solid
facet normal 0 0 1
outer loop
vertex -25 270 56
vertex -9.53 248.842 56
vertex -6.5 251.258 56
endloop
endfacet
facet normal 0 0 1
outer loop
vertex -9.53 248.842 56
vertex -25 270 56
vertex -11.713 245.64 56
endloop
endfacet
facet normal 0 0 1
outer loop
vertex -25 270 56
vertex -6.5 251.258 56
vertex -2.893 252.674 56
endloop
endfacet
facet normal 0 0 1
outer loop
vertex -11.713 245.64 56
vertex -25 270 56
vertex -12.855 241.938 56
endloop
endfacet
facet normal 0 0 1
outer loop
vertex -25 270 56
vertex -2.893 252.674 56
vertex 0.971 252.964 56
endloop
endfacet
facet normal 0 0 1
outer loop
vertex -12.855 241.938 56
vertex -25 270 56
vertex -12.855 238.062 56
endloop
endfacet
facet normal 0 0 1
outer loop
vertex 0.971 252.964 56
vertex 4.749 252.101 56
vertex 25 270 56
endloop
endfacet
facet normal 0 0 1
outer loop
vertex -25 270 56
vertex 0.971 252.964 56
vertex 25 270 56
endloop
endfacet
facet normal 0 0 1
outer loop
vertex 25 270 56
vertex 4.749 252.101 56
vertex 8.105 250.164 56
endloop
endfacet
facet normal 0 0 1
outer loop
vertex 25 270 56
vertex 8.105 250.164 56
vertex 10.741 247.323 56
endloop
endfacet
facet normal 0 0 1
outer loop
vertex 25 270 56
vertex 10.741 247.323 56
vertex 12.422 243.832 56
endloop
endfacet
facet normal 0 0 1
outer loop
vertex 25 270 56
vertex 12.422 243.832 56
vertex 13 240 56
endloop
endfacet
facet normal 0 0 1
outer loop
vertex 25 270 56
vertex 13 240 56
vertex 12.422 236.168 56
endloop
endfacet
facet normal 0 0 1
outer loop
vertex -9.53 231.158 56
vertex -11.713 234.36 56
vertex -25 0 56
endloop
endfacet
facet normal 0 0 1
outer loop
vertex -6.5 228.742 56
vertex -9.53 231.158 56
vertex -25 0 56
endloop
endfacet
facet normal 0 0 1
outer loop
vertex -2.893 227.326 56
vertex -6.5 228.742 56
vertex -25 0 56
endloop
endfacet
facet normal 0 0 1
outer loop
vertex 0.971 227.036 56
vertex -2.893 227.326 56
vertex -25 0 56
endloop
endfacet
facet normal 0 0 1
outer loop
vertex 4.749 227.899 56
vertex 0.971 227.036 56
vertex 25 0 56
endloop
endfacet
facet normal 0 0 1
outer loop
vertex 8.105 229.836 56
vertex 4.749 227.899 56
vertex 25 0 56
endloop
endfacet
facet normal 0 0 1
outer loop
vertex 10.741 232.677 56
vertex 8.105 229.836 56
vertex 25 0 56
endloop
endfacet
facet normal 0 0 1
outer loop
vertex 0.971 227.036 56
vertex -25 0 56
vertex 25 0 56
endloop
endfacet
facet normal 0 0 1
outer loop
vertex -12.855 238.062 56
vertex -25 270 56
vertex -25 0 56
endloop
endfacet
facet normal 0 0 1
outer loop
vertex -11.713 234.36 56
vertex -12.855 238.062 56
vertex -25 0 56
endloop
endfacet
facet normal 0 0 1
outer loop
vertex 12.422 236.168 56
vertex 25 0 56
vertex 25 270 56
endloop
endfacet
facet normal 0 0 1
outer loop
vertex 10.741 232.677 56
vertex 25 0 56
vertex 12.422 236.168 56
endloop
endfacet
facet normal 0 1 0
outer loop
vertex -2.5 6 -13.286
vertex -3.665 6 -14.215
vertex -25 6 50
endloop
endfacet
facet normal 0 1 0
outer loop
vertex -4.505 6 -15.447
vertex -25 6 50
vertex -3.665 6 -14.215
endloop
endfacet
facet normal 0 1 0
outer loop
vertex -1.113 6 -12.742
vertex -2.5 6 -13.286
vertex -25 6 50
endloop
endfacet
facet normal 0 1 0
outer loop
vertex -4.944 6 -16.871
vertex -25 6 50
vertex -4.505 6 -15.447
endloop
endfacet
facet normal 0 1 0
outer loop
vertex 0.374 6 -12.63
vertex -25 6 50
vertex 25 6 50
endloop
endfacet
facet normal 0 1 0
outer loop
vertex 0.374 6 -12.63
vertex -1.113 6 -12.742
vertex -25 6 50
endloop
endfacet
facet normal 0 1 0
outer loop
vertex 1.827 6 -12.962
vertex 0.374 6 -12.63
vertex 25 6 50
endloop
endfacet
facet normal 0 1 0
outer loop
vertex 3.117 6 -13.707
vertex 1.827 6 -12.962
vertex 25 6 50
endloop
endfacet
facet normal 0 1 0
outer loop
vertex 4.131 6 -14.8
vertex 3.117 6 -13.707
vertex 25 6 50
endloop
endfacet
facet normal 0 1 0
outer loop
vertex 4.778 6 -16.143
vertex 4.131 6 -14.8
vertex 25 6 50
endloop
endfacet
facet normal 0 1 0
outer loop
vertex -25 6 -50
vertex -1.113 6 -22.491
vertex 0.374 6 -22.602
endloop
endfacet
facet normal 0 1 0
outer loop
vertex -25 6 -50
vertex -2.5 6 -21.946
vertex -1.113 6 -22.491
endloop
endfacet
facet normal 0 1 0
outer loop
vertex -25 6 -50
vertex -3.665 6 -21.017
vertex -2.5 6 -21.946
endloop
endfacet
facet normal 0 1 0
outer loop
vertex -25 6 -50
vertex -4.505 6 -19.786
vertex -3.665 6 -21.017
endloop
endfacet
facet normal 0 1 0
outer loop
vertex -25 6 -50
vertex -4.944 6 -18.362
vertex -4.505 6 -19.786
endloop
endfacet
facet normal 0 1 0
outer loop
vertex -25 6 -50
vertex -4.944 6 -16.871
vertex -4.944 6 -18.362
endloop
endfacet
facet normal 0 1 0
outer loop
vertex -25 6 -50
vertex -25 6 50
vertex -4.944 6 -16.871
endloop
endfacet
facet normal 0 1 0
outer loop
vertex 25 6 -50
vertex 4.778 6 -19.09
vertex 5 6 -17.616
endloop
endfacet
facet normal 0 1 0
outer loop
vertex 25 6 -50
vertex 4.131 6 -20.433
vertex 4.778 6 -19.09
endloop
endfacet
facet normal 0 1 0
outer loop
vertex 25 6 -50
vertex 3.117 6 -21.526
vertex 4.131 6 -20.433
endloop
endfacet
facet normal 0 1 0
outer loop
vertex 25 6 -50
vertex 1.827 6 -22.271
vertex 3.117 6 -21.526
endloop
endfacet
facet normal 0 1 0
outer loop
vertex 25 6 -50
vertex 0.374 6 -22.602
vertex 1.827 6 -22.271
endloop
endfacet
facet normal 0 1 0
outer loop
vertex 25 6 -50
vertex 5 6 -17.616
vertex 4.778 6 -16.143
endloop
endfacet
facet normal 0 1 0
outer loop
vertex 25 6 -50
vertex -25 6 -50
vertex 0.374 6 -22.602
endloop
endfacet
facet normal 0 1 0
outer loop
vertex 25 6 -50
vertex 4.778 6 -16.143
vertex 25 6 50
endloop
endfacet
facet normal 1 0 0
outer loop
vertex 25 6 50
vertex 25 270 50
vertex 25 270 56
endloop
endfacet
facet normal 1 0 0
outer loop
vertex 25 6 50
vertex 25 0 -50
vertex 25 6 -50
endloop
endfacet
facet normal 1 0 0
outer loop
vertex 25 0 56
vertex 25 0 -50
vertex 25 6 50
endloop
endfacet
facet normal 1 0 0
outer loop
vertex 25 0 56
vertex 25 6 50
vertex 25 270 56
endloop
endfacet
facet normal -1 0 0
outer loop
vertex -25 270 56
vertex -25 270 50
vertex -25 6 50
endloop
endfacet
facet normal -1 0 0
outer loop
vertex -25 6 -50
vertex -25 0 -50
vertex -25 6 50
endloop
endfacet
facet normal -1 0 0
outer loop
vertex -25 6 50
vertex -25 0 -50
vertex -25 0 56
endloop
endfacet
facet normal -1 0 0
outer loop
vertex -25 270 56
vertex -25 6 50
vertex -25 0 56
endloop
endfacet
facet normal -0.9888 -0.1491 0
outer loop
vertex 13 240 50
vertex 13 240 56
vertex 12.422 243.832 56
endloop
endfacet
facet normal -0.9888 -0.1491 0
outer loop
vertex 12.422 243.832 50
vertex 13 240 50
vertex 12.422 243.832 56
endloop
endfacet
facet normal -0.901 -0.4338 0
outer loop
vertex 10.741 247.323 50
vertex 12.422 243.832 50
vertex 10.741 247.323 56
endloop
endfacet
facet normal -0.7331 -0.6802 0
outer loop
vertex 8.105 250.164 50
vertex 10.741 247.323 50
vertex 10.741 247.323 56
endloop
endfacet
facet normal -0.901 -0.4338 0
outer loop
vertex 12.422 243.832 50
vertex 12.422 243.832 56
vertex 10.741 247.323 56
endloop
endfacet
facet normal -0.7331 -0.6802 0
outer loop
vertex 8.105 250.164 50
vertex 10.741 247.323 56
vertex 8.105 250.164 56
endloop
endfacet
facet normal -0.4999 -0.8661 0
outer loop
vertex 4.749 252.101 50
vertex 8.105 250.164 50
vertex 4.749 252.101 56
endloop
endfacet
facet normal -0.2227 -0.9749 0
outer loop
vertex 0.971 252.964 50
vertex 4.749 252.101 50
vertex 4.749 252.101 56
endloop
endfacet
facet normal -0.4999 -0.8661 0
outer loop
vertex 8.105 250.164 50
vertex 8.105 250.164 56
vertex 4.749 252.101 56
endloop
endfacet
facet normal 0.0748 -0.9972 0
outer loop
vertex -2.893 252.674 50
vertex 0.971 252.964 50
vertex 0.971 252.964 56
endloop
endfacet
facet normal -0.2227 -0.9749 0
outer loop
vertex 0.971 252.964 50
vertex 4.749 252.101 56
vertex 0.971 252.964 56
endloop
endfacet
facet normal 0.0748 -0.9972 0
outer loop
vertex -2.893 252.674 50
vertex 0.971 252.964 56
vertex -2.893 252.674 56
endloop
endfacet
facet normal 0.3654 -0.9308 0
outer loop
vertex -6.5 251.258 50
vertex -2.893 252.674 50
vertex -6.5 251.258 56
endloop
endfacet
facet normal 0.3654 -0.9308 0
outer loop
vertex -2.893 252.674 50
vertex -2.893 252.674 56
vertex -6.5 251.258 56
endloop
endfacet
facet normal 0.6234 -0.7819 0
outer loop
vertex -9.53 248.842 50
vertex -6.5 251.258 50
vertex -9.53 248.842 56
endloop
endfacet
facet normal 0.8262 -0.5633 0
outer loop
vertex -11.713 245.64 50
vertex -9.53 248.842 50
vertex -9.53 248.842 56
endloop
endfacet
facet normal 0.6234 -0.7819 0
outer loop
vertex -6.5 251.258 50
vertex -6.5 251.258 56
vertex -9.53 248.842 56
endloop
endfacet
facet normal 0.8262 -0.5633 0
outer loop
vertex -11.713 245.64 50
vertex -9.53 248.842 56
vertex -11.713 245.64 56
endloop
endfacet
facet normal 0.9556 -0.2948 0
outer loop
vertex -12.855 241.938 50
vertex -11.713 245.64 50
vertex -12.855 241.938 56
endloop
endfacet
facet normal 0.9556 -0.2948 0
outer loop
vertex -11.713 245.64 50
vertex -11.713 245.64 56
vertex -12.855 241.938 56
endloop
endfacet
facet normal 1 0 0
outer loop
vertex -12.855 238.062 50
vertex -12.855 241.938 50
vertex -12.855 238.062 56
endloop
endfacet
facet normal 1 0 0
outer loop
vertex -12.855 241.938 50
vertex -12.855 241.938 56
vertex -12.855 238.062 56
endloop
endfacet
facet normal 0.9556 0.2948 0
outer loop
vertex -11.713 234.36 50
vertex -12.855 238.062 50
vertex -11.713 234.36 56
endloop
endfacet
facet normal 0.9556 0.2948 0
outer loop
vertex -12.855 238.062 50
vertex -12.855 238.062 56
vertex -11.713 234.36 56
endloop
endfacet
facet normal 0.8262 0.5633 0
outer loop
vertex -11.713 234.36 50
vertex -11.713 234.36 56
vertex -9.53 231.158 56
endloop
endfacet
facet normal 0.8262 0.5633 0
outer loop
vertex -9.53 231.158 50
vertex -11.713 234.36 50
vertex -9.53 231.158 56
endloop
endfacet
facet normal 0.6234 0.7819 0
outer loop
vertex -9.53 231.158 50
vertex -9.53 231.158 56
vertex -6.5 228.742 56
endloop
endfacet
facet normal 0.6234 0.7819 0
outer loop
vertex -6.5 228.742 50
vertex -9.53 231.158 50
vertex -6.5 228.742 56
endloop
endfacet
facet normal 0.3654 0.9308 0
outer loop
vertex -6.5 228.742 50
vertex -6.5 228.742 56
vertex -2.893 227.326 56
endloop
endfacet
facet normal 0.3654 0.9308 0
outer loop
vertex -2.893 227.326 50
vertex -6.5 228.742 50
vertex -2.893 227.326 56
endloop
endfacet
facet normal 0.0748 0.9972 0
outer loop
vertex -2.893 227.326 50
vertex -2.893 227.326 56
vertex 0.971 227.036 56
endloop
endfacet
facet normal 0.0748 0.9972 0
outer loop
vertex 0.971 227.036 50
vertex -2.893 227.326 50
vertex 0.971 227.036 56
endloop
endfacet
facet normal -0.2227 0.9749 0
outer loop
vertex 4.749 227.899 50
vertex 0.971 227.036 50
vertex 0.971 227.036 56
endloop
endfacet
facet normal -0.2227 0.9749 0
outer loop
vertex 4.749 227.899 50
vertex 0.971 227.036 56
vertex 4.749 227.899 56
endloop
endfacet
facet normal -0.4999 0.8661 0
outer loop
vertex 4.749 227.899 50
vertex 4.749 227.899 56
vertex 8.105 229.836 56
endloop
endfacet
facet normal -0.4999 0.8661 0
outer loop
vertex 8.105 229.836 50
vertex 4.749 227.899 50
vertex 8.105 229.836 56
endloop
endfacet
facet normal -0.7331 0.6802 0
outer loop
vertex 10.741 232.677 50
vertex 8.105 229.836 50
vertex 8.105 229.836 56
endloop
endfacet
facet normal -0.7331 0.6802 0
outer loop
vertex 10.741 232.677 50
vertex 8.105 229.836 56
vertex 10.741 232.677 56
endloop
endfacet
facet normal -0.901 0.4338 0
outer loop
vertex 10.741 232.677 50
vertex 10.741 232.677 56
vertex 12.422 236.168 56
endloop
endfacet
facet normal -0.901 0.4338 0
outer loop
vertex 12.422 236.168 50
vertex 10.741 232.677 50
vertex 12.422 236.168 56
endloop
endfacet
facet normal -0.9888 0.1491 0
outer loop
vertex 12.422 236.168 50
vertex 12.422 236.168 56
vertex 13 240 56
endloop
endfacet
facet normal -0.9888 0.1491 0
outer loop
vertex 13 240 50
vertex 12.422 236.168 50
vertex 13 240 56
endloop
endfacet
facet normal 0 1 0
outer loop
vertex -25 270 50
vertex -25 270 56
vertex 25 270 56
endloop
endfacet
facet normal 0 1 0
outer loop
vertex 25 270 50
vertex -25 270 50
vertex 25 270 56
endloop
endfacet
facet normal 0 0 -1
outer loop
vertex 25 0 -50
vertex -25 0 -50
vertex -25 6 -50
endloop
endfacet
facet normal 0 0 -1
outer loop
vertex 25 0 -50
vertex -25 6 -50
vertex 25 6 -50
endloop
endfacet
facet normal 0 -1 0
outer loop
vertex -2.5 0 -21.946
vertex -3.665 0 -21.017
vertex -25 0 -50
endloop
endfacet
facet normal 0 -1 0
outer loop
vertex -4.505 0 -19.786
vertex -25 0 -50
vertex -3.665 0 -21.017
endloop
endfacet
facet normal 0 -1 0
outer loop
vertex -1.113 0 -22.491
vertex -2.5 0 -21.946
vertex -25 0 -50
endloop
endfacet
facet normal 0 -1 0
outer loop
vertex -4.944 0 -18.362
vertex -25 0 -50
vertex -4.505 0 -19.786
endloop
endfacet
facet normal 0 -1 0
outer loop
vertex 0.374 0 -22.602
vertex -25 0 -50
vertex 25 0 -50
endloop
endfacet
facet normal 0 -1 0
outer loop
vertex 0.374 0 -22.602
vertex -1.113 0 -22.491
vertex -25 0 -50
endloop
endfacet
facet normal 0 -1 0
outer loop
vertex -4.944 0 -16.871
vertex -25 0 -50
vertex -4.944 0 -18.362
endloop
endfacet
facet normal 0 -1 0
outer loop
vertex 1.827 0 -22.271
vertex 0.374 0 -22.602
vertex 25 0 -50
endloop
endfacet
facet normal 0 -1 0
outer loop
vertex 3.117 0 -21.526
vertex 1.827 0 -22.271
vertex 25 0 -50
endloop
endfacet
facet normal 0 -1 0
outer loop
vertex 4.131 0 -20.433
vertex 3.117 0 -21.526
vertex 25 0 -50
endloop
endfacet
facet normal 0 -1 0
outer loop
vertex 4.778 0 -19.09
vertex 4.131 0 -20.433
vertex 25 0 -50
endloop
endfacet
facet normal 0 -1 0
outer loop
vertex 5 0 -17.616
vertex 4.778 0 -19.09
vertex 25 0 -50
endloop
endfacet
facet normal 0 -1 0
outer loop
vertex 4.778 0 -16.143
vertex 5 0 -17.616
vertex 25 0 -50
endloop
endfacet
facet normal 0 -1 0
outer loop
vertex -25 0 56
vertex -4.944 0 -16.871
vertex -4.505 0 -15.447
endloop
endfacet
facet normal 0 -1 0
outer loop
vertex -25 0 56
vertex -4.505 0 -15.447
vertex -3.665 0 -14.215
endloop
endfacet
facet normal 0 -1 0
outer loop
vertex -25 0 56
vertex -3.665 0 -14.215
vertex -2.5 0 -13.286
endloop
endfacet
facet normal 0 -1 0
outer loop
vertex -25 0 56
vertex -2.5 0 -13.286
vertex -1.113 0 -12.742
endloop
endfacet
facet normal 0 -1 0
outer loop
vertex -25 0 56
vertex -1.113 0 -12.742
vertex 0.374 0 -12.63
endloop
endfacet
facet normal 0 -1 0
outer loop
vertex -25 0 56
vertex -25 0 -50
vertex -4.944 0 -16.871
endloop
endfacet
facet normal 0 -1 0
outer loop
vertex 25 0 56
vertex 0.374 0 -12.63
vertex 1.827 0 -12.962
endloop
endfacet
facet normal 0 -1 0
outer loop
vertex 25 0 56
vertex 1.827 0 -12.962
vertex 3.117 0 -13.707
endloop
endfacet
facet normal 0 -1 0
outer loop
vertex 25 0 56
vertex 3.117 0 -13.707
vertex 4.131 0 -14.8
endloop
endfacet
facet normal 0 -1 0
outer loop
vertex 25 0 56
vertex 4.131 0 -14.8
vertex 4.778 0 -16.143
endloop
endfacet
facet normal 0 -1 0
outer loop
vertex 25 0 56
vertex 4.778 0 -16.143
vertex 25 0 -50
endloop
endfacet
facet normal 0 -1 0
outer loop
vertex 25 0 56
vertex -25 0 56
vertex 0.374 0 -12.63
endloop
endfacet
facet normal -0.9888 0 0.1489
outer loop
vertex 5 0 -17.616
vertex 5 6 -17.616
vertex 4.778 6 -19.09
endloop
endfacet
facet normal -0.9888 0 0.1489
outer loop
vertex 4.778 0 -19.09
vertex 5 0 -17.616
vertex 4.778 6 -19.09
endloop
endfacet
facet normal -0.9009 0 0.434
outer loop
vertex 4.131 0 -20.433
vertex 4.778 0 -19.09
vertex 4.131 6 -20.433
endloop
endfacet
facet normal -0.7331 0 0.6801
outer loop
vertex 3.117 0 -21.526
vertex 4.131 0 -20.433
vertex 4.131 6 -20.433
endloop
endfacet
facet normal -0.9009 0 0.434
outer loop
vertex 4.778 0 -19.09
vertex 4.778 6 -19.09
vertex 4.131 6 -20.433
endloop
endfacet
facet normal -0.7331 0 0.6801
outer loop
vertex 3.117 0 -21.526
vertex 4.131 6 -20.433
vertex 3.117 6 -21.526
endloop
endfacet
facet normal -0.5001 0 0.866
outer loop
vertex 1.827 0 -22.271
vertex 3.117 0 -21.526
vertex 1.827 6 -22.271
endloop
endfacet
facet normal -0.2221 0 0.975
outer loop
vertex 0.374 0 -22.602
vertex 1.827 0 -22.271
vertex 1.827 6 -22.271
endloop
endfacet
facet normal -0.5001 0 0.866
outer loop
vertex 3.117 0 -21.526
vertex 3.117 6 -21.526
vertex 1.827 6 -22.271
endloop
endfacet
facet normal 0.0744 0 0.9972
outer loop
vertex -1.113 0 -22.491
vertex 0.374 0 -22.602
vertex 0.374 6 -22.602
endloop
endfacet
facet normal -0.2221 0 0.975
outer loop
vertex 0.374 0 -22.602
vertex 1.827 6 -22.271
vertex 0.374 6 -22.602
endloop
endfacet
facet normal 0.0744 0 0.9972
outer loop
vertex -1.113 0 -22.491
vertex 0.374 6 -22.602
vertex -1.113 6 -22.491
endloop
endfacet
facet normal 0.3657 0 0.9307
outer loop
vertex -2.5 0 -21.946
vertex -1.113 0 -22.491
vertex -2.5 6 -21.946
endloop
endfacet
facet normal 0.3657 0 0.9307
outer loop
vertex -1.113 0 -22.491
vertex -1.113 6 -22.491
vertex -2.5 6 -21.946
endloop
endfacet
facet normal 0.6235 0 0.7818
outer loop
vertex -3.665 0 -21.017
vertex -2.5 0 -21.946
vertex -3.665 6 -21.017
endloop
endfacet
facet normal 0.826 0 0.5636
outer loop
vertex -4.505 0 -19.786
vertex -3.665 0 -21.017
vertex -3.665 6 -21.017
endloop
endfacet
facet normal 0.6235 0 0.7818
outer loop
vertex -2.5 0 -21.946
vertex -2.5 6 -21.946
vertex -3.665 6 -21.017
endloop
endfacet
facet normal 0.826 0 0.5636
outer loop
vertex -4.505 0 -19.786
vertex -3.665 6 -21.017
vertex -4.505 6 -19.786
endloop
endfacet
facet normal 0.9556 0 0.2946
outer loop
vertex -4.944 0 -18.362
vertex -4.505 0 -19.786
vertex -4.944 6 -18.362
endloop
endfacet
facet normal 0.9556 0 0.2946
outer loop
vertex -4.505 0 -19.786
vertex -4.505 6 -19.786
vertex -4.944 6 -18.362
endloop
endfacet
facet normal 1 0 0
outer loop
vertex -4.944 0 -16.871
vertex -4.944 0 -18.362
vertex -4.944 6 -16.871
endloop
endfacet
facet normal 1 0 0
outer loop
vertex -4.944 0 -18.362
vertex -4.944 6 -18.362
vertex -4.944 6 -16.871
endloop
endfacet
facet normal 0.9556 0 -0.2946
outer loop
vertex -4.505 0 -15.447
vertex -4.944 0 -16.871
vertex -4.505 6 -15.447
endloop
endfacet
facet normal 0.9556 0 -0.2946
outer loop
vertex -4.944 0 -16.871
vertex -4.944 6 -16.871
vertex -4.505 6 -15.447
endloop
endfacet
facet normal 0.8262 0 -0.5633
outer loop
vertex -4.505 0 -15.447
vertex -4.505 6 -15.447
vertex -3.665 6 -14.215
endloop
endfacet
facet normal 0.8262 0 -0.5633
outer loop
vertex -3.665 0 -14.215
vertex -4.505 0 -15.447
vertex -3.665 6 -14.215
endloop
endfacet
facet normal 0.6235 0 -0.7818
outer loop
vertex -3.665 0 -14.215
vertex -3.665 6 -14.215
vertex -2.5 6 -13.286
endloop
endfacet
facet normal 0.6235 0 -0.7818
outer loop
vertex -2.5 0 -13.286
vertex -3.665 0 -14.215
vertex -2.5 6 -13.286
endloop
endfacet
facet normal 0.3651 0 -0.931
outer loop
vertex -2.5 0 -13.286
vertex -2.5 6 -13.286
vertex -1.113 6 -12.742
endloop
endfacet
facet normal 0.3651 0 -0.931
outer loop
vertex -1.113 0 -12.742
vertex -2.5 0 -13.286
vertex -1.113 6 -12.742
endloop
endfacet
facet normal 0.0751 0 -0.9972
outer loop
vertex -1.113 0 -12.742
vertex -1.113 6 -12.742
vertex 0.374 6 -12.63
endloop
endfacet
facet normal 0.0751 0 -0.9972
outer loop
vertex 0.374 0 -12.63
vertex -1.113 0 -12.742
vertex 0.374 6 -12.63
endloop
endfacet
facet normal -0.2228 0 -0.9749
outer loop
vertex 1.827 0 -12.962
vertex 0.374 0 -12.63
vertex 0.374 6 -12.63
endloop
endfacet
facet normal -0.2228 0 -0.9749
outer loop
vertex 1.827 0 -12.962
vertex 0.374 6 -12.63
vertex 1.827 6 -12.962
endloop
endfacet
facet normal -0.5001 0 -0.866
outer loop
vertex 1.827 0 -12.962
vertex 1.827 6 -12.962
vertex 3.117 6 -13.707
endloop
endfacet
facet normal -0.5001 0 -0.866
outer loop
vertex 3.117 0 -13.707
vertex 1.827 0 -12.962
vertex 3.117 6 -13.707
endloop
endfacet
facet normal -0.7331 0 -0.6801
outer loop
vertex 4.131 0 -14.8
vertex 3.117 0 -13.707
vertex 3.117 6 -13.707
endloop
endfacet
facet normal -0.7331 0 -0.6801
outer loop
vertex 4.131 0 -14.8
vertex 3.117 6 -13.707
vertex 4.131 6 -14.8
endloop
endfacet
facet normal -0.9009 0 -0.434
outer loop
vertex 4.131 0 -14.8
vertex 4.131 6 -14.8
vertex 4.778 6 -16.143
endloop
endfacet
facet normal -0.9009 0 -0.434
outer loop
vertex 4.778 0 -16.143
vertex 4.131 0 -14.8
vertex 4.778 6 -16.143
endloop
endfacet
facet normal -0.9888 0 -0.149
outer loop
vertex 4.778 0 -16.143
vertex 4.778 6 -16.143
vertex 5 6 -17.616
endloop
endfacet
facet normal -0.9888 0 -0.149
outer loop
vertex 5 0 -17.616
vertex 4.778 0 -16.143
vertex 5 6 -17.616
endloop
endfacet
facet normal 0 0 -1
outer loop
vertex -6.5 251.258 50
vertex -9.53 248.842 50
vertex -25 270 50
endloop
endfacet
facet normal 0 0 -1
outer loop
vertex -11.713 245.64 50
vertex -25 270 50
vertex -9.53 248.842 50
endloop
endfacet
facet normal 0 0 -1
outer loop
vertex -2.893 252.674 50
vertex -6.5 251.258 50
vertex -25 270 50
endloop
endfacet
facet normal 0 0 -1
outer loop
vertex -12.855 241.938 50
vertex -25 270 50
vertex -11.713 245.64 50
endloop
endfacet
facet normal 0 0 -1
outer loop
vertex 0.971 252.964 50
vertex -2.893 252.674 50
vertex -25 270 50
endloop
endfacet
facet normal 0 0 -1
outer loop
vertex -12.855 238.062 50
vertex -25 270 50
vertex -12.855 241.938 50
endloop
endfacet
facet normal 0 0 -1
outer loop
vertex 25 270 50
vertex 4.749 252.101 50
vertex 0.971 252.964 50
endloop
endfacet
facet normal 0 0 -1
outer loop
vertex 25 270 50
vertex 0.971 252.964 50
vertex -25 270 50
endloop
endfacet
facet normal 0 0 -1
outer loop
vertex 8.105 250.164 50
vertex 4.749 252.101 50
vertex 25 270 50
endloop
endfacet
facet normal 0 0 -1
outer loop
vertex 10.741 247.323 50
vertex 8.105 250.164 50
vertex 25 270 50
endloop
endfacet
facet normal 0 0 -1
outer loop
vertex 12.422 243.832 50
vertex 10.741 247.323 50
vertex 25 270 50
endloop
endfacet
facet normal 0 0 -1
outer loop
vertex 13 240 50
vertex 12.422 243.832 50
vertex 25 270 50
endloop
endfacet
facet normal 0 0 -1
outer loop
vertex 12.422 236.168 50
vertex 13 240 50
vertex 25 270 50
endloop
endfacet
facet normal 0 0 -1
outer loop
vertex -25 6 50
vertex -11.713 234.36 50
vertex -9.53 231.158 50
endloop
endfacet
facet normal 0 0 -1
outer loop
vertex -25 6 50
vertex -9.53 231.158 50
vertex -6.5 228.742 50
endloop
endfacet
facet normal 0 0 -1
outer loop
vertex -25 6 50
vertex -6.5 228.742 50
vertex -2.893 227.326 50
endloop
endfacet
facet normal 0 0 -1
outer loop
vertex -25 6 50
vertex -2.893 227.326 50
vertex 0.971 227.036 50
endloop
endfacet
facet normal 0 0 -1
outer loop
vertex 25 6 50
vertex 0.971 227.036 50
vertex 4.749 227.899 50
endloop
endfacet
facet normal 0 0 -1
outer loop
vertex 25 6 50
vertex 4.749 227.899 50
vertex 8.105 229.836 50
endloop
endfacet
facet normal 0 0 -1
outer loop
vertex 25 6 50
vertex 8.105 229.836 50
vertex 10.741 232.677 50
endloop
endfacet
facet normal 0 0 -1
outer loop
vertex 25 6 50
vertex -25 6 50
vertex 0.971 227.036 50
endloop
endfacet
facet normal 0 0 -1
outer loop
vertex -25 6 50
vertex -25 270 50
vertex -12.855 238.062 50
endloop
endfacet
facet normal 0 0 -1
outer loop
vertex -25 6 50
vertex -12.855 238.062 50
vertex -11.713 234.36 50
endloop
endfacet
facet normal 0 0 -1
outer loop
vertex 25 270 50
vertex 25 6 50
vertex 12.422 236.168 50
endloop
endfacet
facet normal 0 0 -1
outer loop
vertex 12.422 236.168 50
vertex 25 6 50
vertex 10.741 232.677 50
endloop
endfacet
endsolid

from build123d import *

# Parameters (mm, degrees)
CROQUIS1_W              = 50
CROQUIS1_H              = 100
SALIENTE_EXTRUIR1_DEPTH = 6
CROQUIS2_W              = 50
CROQUIS2_H              = 6
SALIENTE_EXTRUIR2_DEPTH = 270
CROQUIS3_R              = 13
CORTAR_EXTRUIR1_DEPTH   = 107
SKETCH1_R               = 5
CUT_EXTRUDE1_DEPTH      = 10


with BuildPart() as part:
    # Croquis1 → Saliente-Extruir1 (new body)
    with BuildSketch(Plane(origin=(0, 0, 0), x_dir=(1, 0, 0), z_dir=(0, 1, 0))):
        Rectangle(CROQUIS1_W, CROQUIS1_H)
    extrude(amount=SALIENTE_EXTRUIR1_DEPTH)

    # Croquis2 → Saliente-Extruir2 (add)
    with BuildSketch(Plane.XZ):
        with Locations((0, 53)):
            Rectangle(CROQUIS2_W, CROQUIS2_H)
    extrude(amount=-SALIENTE_EXTRUIR2_DEPTH)

    # Croquis3 → Cortar-Extruir1 (cut, through all)
    with BuildSketch(Plane.XY.offset(56)):
        with Locations((0, 240)):
            Circle(CROQUIS3_R)
    extrude(amount=-CORTAR_EXTRUIR1_DEPTH, mode=Mode.SUBTRACT)

    # Sketch1 → Cut-Extrude1 (cut)
    with BuildSketch(Plane(origin=(0, 6, 0), x_dir=(1, 0, 0), z_dir=(0, 1, 0))):
        with Locations((0, 17.616363636)):
            Circle(SKETCH1_R)
    extrude(amount=-CUT_EXTRUDE1_DEPTH, mode=Mode.SUBTRACT)


solid = part.part
